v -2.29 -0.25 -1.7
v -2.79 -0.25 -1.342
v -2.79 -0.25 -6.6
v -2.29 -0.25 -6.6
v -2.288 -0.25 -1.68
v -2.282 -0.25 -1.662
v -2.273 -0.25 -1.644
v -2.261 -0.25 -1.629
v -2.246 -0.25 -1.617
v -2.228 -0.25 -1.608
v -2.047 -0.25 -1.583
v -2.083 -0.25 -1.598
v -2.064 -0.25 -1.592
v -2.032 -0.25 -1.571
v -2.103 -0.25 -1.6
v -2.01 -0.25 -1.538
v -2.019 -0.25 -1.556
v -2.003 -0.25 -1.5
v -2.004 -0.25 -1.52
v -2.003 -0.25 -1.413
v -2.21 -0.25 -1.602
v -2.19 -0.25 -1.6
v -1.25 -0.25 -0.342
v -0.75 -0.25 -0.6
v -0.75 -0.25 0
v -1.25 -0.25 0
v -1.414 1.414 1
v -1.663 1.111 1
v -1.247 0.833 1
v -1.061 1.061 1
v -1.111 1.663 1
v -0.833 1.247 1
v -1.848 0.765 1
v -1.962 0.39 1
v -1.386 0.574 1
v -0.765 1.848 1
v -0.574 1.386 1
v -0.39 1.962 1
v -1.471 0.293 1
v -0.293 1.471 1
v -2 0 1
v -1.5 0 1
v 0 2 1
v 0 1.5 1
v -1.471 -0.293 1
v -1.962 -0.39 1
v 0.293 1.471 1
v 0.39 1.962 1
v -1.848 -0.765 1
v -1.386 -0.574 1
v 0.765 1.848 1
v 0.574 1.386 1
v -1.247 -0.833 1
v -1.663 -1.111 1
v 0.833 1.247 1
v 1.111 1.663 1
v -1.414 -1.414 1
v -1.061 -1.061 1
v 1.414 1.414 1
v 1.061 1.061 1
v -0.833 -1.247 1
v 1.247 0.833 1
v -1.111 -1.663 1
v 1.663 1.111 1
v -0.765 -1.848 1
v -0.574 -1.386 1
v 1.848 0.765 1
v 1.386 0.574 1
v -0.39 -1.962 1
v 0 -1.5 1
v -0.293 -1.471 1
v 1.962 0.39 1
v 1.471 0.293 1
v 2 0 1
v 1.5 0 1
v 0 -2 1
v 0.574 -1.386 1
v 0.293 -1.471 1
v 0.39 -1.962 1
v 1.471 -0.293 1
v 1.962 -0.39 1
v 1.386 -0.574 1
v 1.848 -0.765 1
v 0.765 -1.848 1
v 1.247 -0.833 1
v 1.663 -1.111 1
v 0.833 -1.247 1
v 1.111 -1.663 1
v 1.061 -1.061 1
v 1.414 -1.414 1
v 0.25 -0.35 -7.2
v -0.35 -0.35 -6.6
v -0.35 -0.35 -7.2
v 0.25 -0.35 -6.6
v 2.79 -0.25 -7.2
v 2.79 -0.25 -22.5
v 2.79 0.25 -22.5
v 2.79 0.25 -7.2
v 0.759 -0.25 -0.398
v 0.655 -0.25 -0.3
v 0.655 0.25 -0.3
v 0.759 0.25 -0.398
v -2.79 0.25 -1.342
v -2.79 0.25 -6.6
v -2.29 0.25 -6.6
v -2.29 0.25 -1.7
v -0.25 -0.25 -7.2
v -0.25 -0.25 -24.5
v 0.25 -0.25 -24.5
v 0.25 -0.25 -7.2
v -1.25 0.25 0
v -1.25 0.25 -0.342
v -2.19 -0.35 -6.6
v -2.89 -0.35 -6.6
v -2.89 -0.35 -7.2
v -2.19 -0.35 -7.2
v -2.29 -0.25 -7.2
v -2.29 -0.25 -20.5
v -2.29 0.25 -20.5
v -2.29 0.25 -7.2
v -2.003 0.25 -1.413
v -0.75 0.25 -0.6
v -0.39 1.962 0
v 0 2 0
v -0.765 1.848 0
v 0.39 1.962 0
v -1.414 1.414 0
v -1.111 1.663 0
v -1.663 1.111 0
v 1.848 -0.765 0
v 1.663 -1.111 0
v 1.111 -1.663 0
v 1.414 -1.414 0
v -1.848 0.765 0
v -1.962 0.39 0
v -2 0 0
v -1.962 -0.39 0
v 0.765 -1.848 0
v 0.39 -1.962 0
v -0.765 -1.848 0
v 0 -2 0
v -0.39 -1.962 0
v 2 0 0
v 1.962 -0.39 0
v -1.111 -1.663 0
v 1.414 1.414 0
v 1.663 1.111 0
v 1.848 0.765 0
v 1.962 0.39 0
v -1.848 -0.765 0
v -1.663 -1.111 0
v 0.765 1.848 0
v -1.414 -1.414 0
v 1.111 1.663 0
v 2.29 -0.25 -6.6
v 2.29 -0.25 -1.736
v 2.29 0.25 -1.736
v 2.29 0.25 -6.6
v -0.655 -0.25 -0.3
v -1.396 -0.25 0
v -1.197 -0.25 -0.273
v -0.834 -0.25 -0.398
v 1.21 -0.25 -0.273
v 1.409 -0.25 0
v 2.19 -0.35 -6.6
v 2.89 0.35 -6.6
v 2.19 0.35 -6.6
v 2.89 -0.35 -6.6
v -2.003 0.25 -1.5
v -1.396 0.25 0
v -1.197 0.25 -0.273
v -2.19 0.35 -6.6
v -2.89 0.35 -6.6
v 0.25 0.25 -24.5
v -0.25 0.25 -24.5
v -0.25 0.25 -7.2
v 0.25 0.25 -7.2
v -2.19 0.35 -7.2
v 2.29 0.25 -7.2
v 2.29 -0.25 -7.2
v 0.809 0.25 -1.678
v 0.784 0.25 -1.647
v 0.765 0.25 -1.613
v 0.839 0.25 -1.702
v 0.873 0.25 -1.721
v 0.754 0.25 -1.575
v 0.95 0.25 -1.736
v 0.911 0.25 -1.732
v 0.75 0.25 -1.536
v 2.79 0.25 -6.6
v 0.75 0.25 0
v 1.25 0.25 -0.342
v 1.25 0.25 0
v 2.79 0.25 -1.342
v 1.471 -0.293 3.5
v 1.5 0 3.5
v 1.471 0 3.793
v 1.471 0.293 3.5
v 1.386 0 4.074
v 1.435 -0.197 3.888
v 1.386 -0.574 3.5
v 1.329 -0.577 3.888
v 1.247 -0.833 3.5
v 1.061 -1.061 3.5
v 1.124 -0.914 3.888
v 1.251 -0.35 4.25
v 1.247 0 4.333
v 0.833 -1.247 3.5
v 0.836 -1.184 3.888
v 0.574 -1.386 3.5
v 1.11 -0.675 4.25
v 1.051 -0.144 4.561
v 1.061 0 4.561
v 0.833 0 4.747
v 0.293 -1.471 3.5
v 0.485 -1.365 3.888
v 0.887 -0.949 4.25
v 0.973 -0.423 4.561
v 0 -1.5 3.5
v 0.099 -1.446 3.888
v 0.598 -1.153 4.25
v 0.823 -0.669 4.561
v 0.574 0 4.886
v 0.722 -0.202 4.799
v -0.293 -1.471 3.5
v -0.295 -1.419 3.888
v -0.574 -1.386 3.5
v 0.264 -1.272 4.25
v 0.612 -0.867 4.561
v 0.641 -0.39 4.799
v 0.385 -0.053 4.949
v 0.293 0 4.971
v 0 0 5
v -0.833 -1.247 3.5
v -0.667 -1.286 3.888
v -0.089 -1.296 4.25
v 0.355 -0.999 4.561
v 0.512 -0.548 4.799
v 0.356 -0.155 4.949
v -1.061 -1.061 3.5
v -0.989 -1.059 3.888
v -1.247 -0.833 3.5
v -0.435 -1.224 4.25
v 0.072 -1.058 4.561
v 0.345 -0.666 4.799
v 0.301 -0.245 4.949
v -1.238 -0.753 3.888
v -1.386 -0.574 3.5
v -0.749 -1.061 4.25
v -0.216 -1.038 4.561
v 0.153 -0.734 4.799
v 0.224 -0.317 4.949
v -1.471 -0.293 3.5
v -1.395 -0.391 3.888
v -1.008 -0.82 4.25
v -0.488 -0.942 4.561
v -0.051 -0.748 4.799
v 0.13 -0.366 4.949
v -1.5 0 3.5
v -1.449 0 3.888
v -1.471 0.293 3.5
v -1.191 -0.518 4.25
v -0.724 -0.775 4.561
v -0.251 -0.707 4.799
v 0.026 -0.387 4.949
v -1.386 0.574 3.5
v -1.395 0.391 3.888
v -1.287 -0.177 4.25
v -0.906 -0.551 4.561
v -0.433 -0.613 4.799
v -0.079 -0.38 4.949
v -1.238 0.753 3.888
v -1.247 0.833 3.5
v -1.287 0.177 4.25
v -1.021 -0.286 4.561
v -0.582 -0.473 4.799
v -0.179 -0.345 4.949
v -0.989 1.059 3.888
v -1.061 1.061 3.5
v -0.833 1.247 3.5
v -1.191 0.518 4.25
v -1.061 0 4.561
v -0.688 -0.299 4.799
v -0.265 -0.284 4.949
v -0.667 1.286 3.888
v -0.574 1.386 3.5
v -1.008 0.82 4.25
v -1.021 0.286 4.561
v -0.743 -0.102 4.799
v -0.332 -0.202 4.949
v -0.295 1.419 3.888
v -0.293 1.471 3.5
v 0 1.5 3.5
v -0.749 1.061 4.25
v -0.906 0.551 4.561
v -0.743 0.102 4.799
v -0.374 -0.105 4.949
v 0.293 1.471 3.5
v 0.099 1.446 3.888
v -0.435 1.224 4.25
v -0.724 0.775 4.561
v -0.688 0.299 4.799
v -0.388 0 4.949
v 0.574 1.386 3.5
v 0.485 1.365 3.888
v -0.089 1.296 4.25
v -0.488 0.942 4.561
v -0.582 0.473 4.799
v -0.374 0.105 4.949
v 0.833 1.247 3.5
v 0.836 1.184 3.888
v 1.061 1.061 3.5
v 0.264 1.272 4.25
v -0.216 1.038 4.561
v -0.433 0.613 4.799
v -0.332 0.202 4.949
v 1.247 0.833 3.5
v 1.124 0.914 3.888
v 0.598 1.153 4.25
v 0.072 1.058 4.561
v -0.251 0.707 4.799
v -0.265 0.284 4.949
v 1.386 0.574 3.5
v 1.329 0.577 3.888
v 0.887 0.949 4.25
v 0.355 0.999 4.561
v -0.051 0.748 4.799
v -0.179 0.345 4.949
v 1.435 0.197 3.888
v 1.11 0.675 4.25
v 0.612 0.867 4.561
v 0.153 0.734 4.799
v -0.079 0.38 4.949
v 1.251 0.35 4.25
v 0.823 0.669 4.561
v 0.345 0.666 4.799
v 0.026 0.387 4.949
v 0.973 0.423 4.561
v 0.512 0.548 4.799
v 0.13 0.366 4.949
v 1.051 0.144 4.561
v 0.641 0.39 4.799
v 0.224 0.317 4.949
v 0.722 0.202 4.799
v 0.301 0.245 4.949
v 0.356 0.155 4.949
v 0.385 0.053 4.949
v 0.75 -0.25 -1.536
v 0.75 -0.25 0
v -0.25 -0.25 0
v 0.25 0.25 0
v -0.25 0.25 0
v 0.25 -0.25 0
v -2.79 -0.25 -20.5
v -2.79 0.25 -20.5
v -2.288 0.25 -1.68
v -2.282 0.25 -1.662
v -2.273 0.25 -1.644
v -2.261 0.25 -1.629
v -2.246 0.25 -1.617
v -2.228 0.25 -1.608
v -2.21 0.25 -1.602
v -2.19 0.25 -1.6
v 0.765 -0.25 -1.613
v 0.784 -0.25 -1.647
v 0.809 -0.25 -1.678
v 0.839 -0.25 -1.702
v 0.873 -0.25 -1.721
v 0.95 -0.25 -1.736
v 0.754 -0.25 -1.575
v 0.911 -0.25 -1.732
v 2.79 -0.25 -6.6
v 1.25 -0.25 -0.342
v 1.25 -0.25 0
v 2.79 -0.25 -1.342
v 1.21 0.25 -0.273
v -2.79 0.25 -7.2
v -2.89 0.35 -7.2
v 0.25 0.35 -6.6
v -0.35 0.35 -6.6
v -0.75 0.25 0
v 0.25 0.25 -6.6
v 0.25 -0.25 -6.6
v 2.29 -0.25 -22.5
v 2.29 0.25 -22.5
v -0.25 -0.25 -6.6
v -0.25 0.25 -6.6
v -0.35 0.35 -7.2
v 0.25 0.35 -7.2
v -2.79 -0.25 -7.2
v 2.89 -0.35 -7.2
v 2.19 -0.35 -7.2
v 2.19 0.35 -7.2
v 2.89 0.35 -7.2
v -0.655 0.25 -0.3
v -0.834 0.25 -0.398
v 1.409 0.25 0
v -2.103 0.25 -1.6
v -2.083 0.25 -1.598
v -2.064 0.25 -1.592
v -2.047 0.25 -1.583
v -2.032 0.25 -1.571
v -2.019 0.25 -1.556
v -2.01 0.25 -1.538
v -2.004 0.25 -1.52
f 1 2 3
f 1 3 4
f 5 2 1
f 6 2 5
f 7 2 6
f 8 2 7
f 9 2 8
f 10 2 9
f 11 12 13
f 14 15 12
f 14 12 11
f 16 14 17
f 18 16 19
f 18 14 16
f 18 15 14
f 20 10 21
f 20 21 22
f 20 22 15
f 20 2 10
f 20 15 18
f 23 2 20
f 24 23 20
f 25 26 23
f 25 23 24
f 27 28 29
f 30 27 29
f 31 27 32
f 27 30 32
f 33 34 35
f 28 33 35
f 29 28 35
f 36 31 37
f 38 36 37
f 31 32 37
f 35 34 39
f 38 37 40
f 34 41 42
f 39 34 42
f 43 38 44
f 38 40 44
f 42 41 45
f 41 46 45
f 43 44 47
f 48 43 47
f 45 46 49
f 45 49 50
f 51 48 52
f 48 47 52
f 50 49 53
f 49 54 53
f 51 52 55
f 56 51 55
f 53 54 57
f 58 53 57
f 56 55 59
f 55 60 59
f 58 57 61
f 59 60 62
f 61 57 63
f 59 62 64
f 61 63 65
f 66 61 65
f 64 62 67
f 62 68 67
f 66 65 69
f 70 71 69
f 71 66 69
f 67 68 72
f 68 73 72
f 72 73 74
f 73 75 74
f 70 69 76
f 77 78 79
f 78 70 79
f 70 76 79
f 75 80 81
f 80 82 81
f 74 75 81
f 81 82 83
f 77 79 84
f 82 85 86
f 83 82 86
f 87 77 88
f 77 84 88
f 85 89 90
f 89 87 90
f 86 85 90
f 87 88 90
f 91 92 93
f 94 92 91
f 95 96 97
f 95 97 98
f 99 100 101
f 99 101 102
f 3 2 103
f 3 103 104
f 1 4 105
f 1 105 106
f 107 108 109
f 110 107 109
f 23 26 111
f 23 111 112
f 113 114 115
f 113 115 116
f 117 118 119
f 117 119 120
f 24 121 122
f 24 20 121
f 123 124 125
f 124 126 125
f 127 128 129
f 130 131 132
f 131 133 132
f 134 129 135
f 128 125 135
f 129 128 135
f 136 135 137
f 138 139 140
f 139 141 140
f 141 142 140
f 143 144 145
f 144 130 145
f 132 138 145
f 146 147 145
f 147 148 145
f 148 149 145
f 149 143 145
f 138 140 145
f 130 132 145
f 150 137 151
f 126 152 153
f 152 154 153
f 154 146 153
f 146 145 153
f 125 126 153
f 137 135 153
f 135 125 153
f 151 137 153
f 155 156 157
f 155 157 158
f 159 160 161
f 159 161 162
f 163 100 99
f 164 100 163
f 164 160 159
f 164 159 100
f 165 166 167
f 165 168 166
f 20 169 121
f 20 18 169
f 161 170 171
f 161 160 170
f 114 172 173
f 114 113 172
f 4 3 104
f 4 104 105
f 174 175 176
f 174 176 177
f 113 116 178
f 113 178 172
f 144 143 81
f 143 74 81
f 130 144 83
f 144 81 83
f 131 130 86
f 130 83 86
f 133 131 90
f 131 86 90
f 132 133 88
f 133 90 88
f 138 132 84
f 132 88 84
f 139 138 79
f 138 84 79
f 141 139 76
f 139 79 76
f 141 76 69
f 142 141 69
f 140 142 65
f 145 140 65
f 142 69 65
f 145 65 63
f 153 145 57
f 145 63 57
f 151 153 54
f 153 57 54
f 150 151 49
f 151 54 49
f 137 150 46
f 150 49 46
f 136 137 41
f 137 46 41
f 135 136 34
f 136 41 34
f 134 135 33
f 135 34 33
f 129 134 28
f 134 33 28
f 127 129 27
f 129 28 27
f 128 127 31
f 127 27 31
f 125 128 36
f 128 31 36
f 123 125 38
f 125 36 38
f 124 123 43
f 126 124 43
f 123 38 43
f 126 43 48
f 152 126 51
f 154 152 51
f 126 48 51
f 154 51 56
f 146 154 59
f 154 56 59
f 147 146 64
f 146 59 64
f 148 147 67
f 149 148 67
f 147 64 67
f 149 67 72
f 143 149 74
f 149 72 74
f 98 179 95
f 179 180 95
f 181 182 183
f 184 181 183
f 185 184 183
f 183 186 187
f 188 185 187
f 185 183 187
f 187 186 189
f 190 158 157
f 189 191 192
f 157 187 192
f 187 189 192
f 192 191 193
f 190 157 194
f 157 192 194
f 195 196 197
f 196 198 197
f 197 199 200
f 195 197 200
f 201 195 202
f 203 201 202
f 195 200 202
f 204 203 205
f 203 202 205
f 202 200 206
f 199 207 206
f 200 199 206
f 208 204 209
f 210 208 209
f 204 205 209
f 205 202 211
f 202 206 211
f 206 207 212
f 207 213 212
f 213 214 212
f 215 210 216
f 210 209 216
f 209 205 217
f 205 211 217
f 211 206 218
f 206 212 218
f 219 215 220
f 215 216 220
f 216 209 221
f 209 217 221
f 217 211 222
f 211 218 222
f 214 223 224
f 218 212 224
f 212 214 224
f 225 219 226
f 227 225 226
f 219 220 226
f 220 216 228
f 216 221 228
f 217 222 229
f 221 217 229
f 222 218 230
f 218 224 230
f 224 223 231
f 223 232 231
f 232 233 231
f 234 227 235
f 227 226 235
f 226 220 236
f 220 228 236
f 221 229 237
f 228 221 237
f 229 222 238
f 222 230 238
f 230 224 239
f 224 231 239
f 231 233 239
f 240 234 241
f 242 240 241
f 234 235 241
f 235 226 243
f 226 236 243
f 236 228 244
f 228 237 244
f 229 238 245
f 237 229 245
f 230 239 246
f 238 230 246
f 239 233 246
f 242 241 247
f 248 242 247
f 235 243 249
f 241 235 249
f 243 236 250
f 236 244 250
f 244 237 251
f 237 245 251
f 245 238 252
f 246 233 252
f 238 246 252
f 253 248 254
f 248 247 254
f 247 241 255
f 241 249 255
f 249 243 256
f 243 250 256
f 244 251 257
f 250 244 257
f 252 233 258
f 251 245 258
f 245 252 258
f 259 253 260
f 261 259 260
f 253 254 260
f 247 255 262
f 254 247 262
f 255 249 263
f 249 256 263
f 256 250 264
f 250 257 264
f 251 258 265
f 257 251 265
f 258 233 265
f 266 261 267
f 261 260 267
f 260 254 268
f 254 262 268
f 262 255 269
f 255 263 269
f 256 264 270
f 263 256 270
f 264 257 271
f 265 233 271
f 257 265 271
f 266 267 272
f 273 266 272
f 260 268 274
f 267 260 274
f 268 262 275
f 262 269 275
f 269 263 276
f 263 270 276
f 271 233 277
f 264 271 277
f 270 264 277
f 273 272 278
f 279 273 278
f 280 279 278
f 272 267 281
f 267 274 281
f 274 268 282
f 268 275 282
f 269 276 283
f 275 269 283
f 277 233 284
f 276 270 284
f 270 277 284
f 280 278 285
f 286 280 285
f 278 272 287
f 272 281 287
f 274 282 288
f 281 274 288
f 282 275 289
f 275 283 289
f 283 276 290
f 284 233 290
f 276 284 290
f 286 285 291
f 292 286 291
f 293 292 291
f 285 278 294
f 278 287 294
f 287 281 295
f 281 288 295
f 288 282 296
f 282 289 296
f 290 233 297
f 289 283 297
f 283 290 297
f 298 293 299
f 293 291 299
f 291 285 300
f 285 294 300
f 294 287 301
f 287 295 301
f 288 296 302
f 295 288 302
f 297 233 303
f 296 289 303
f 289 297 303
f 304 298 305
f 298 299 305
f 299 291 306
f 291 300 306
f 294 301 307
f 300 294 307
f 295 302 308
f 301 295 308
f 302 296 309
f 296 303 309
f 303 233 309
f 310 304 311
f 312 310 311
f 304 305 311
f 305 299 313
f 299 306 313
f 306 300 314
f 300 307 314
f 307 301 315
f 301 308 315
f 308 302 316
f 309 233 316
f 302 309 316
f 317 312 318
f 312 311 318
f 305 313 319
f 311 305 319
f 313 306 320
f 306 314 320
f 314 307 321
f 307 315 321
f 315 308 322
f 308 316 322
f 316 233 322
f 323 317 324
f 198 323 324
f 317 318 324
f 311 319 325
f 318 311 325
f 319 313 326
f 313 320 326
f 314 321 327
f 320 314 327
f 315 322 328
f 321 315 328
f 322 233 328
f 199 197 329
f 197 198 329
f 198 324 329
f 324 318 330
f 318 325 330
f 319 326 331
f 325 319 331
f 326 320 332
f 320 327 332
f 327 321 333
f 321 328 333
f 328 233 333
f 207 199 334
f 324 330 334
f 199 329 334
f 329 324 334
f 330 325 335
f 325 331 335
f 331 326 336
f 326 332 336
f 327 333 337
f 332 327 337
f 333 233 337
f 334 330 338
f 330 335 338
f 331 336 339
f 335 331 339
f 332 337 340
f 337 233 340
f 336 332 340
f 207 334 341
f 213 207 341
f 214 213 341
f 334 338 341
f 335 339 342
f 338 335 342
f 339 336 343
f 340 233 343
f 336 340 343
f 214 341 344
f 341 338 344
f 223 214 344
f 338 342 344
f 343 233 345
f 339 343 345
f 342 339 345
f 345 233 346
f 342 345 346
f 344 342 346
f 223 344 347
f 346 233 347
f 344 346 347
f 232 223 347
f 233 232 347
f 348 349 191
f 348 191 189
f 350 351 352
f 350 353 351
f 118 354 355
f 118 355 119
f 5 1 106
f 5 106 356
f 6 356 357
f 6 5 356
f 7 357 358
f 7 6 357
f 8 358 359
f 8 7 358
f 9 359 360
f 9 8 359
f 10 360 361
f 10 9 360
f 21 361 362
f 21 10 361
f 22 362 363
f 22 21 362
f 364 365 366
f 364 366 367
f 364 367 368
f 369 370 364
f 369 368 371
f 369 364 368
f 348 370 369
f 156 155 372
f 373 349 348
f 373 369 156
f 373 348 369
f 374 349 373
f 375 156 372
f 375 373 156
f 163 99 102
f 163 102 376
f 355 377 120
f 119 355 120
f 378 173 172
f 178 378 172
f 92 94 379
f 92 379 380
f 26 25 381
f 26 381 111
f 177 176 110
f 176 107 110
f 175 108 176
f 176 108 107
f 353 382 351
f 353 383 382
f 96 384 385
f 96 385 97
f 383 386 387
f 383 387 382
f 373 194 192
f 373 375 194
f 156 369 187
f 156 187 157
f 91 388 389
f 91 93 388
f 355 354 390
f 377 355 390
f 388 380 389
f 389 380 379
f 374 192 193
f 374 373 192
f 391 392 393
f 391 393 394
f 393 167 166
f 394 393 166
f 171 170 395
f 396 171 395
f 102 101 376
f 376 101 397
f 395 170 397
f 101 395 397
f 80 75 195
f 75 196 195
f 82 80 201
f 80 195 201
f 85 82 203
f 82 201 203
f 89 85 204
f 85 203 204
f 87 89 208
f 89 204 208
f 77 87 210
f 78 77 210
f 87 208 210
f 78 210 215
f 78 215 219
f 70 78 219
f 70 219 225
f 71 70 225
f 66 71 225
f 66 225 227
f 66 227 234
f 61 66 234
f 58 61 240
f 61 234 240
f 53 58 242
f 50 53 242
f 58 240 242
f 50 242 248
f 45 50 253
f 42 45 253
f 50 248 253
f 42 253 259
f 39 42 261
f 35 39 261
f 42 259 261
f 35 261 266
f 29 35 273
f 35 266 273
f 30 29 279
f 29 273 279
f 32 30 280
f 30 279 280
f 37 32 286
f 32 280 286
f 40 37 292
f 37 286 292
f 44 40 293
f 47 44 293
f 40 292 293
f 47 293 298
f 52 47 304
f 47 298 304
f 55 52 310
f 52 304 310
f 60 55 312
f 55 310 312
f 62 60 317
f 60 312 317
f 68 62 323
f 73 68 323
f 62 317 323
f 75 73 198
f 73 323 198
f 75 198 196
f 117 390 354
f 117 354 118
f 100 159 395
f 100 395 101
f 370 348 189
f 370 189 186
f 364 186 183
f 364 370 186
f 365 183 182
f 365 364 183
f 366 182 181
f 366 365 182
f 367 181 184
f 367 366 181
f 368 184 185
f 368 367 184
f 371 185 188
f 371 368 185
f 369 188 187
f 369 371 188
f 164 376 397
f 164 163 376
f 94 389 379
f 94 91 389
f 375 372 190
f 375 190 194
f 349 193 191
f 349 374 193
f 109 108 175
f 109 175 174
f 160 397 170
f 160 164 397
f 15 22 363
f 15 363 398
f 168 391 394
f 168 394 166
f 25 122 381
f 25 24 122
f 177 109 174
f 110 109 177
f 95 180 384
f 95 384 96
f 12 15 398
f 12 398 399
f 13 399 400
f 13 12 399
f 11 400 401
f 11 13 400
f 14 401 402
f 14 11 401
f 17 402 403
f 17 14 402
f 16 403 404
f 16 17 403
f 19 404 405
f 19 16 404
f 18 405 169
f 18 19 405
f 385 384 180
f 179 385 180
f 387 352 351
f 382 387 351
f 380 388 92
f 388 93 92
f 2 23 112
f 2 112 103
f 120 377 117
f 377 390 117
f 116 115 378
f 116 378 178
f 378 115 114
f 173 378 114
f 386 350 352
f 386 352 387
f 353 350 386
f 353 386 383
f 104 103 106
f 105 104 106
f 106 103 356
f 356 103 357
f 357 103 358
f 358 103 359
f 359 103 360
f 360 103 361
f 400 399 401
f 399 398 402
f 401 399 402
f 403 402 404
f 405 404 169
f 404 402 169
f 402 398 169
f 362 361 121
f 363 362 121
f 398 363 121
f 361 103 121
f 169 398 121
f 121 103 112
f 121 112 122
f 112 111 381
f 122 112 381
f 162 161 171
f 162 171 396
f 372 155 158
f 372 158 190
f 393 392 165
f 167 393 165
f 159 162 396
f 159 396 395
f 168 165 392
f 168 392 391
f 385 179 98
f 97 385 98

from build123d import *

# Parameters (mm, degrees)
F2_W     = 0.5
F2_H     = 13.3
F3_DEPTH = 0.25
F2_H_2   = 15.3
F2_H_3   = 17.3
F5_DEPTH = 0.25
F2_H_4   = 0.6
F2_W_2   = 0.1
F6_DEPTH = 0.35


with BuildPart() as f1:
    # F0 (on Front) → F1 (revolve)
    with BuildSketch(Plane.XZ):
        with BuildLine():
            Line((0, 5), (0, 1))
            Line((0, 1), (1.5, 1))
            Line((1.5, 1), (1.5, 3.5))
            ThreePointArc((1.5, 3.5), (1.0606601718, 4.5606601718), (0, 5))
        make_face()
        Polygon((0, 1), (0, 0), (2, 0), (2, 1), (1.5, 1), align=None)
    revolve(axis=Axis((0, 0, 3), (0, 0, -1)))


with BuildPart() as f3:
    # F2 (on Front) → F3 (new body, symmetric)
    with BuildSketch(Plane.XZ):
        with Locations((-2.54, -13.85)):
            Rectangle(F2_W, F2_H)
    extrude(amount=F3_DEPTH, both=True)


with BuildPart() as f3b:
    # F2 (on Front) → F3, piece 2 (new body, symmetric)
    with BuildSketch(Plane.XZ):
        Polygon((0.25, 0), (0, 0), (-0.25, 0), (-0.25, -6.6), (0, -6.6), (0.25, -6.6), align=None)
    extrude(amount=F3_DEPTH, both=True)


with BuildPart() as f3c:
    # F2 (on Front) → F3, piece 3 (new body, symmetric)
    with BuildSketch(Plane.XZ):
        with Locations((2.54, -14.85)):
            Rectangle(F2_W, F2_H_2)
    extrude(amount=F3_DEPTH, both=True)


with BuildPart() as f3d:
    # F2 (on Front) → F3, piece 4 (new body, symmetric)
    with BuildSketch(Plane.XZ):
        with BuildLine():
            Line((1.25, 0), (0.75, 0))
            Line((0.75, 0), (0.75, -0.6))
            Line((0.75, -0.6), (0.75, -1.5361567198))
            ThreePointArc((0.75, -1.5361567198), (0.8085786438, -1.6775780761), (0.95, -1.7361567198))
            Line((0.95, -1.7361567198), (2.29, -1.7361567198))
            Line((2.29, -1.7361567198), (2.29, -6.6))
            Line((2.29, -6.6), (2.79, -6.6))
            Line((2.79, -6.6), (2.79, -1.6))
            Line((2.79, -1.6), (2.79, -1.3415418103))
            Line((2.79, -1.3415418103), (1.25, -0.3415418103))
            Line((1.25, -0.3415418103), (1.25, 0))
        make_face()
    extrude(amount=F3_DEPTH, both=True)


with BuildPart() as f3e:
    # F2 (on Front) → F3, piece 5 (new body, symmetric)
    with BuildSketch(Plane.XZ):
        with BuildLine():
            Line((-0.75, -0.6), (-0.75, 0))
            Line((-0.75, 0), (-1.25, 0))
            Line((-1.25, 0), (-1.25, -0.3415418103))
            Line((-1.25, -0.3415418103), (-2.79, -1.3415418103))
            Line((-2.79, -1.3415418103), (-2.79, -1.6))
            Line((-2.79, -1.6), (-2.79, -6.6))
            Line((-2.79, -6.6), (-2.29, -6.6))
            Line((-2.29, -6.6), (-2.29, -1.7))
            ThreePointArc((-2.29, -1.7), (-2.2607106781, -1.6292893219), (-2.19, -1.6))
            Line((-2.19, -1.6), (-2.1025689155, -1.6))
            ThreePointArc((-2.1025689155, -1.6), (-2.0318582374, -1.5707106781), (-2.0025689155, -1.5))
            Line((-2.0025689155, -1.5), (-2.0025689155, -1.4133564386))
            Line((-2.0025689155, -1.4133564386), (-0.75, -0.6))
        make_face()
    extrude(amount=F3_DEPTH, both=True)


with BuildPart() as f3f:
    # F2 (on Front) → F3, piece 6 (new body, symmetric)
    with BuildSketch(Plane.XZ):
        with Locations((0, -15.85)):
            Rectangle(F2_W, F2_H_3)
    extrude(amount=F3_DEPTH, both=True)


with BuildPart() as f5:
    # F4 (on Front) → F5 (new body, symmetric)
    with BuildSketch(Plane.XZ):
        Polygon((0, -0.3), (0, 0), (-1.3955442701, 0), (-1.1966704624, -0.2733631991), (-0.8343339432, -0.3976593143), (-0.6548659876, -0.3), (-0.416238152, -0.3), align=None)
        Polygon((1.4089291217, 0), (0, 0), (0, -0.3), (0.416238152, -0.3), (0.6548659876, -0.3), (0.7594542112, -0.3976593143), (1.210055314, -0.2733631991), align=None)
    extrude(amount=F5_DEPTH, both=True)


with BuildPart() as f6:
    # F2 (on Front) → F6 (new body, symmetric)
    with BuildSketch(Plane.XZ):
        with Locations((-2.54, -6.9)):
            Rectangle(F2_W, F2_H_4)
        with Locations((-2.84, -6.9)):
            Rectangle(F2_W_2, F2_H_4)
        with Locations((-2.24, -6.9)):
            Rectangle(F2_W_2, F2_H_4)
    extrude(amount=F6_DEPTH, both=True)


with BuildPart() as f6b:
    # F2 (on Front) → F6, piece 2 (new body, symmetric)
    with BuildSketch(Plane.XZ):
        Polygon((0.25, -7.2), (0.25, -6.6), (0, -6.6), (-0.25, -6.6), (-0.25, -7.2), align=None)
        with Locations((-0.3, -6.9)):
            Rectangle(F2_W_2, F2_H_4)
    extrude(amount=F6_DEPTH, both=True)


with BuildPart() as f6c:
    # F2 (on Front) → F6, piece 3 (new body, symmetric)
    with BuildSketch(Plane.XZ):
        with Locations((2.54, -6.9)):
            Rectangle(F2_W, F2_H_4)
        with Locations((2.24, -6.9)):
            Rectangle(F2_W_2, F2_H_4)
        with Locations((2.84, -6.9)):
            Rectangle(F2_W_2, F2_H_4)
    extrude(amount=F6_DEPTH, both=True)


solid = Compound([f1.part, f3.part, f3b.part, f3c.part, f3d.part, f3e.part, f3f.part, f5.part, f6.part, f6b.part, f6c.part])
